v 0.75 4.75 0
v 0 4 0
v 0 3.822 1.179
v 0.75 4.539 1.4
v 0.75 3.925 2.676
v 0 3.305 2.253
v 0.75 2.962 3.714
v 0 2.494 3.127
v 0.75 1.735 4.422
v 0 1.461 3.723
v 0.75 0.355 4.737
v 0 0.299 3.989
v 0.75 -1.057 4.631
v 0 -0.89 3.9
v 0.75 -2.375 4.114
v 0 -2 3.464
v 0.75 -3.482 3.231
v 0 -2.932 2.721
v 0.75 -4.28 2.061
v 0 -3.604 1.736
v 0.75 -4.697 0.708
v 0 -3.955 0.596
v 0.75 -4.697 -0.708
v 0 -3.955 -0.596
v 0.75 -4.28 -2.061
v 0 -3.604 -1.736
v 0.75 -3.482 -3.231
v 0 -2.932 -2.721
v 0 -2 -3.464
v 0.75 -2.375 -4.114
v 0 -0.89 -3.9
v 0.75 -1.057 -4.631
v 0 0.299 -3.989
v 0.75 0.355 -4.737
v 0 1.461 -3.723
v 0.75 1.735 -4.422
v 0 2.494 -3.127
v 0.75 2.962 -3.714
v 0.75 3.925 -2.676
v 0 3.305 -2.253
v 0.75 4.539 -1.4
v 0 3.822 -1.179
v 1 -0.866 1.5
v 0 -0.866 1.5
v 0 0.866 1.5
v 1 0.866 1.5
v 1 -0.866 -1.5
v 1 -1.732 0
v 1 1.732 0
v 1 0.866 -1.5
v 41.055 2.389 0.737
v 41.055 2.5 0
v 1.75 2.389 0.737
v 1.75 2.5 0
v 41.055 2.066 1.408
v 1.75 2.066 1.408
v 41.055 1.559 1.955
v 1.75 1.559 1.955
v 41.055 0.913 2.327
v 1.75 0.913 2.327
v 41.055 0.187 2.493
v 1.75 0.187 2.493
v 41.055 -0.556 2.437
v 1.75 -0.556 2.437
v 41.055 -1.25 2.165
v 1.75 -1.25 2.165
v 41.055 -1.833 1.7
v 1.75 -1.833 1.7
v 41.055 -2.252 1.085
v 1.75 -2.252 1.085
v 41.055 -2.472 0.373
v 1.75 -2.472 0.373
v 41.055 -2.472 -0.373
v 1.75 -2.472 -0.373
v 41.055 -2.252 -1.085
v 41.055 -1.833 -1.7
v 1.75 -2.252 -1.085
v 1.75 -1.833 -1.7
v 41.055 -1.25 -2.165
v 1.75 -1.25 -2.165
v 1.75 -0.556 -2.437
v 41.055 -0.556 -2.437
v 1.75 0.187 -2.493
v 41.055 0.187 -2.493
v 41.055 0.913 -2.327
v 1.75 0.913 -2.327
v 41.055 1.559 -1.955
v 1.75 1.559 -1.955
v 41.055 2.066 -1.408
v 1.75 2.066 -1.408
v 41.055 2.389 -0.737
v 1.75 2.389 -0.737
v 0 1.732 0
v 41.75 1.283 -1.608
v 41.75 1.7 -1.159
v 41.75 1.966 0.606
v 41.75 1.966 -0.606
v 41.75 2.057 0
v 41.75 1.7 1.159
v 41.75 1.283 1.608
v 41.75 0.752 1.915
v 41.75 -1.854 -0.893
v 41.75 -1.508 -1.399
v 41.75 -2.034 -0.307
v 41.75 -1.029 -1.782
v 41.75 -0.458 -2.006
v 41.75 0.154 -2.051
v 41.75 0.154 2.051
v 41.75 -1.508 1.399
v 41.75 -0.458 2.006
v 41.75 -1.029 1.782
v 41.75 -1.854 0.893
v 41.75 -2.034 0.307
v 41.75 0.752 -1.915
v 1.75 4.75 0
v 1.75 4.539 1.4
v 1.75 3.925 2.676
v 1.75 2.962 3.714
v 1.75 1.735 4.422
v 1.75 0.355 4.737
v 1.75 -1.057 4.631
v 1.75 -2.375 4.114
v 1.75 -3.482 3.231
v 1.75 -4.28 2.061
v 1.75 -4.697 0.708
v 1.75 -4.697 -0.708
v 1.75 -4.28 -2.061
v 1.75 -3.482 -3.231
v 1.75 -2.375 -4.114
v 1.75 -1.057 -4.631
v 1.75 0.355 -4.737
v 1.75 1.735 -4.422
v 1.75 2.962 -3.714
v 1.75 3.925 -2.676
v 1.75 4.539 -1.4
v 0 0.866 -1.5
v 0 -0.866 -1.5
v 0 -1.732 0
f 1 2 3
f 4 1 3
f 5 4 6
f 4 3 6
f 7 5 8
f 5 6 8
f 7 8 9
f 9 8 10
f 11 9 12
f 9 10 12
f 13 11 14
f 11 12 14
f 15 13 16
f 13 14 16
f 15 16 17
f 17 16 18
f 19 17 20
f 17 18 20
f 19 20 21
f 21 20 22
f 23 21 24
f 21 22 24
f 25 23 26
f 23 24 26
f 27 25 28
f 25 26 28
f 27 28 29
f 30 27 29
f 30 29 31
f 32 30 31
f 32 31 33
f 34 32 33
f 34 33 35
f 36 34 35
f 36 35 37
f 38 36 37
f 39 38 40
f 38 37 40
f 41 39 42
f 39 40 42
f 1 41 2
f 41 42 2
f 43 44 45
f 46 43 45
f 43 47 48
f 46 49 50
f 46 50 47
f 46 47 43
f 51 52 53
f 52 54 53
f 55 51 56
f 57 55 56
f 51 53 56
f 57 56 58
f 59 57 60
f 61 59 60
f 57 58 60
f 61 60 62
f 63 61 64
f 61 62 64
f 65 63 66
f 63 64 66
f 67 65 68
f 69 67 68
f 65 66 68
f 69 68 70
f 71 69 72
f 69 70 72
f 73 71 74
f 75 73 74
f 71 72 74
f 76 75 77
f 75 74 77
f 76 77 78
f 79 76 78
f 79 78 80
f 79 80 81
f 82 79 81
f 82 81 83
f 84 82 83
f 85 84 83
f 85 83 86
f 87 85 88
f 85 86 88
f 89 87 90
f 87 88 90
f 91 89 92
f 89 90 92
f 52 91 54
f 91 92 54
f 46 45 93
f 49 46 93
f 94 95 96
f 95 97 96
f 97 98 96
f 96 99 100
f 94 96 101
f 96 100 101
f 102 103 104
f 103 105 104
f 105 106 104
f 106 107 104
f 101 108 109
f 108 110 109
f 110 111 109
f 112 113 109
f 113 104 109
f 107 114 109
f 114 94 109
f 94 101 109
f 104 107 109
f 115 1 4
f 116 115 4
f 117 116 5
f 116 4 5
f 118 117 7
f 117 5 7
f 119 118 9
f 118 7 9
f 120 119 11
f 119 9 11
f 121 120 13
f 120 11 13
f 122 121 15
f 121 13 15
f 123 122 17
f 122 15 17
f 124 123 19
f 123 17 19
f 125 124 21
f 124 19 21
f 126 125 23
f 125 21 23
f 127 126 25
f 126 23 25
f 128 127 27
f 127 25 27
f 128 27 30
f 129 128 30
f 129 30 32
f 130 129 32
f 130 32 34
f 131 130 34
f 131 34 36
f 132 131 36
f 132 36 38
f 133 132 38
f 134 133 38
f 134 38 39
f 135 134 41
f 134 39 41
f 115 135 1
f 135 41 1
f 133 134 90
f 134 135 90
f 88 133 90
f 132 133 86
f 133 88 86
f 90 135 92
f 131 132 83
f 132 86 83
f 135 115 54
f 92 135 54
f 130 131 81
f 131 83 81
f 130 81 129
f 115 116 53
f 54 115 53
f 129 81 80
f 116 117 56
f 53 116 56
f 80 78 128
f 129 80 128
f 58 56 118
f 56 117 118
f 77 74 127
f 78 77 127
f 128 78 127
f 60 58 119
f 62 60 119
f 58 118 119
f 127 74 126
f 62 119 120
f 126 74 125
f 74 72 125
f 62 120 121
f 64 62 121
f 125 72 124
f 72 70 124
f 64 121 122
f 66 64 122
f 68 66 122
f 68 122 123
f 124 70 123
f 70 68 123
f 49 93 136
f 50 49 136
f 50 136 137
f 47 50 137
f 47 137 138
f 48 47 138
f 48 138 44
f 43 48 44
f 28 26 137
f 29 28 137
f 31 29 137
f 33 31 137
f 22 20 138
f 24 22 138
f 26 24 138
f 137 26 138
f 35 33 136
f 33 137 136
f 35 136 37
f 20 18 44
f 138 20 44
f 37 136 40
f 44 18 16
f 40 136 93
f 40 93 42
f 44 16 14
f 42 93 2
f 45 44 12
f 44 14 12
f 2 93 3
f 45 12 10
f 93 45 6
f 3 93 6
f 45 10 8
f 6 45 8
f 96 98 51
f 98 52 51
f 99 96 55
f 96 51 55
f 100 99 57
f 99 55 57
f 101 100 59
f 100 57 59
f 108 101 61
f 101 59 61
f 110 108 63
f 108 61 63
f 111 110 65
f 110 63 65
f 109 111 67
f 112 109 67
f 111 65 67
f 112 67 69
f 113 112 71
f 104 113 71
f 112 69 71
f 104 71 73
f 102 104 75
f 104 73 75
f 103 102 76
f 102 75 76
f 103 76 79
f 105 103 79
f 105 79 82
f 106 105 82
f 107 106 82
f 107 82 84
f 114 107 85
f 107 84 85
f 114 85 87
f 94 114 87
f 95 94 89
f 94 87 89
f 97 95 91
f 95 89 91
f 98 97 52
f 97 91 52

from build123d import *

# Parameters (mm, degrees)
CUT_EXTRUDE1_DEPTH = 1
CHAMFER1_SIZE      = 0.75


with BuildPart() as part:
    # Sketch1 → Revolve1 (revolve)
    with BuildSketch(Plane.XY):
        Polygon((41.75, 0), (41.75, 2.057236169), (41.055, 2.5), (1.75, 2.5), (1.75, 4.75), (0, 4.75), (0, 0), align=None)
    revolve(axis=Axis((0, 0, 0), (1, 0, 0)))

    # Sketch5 → Cut-Extrude1 (cut)
    with BuildSketch(Plane.ZY):
        Polygon((1.5, -0.866025404), (1.5, 0.866025404), (0, 1.732050808), (-1.5, 0.866025404), (-1.5, -0.866025404), (0, -1.732050808), align=None)
    extrude(amount=-CUT_EXTRUDE1_DEPTH, mode=Mode.SUBTRACT)

    # Chamfer1
    chamfer1_edges = [part.edges().sort_by_distance(p)[0] for p in [
        (0, -4.75, 0),
    ]]
    chamfer(chamfer1_edges, length=CHAMFER1_SIZE)


solid = part.part
